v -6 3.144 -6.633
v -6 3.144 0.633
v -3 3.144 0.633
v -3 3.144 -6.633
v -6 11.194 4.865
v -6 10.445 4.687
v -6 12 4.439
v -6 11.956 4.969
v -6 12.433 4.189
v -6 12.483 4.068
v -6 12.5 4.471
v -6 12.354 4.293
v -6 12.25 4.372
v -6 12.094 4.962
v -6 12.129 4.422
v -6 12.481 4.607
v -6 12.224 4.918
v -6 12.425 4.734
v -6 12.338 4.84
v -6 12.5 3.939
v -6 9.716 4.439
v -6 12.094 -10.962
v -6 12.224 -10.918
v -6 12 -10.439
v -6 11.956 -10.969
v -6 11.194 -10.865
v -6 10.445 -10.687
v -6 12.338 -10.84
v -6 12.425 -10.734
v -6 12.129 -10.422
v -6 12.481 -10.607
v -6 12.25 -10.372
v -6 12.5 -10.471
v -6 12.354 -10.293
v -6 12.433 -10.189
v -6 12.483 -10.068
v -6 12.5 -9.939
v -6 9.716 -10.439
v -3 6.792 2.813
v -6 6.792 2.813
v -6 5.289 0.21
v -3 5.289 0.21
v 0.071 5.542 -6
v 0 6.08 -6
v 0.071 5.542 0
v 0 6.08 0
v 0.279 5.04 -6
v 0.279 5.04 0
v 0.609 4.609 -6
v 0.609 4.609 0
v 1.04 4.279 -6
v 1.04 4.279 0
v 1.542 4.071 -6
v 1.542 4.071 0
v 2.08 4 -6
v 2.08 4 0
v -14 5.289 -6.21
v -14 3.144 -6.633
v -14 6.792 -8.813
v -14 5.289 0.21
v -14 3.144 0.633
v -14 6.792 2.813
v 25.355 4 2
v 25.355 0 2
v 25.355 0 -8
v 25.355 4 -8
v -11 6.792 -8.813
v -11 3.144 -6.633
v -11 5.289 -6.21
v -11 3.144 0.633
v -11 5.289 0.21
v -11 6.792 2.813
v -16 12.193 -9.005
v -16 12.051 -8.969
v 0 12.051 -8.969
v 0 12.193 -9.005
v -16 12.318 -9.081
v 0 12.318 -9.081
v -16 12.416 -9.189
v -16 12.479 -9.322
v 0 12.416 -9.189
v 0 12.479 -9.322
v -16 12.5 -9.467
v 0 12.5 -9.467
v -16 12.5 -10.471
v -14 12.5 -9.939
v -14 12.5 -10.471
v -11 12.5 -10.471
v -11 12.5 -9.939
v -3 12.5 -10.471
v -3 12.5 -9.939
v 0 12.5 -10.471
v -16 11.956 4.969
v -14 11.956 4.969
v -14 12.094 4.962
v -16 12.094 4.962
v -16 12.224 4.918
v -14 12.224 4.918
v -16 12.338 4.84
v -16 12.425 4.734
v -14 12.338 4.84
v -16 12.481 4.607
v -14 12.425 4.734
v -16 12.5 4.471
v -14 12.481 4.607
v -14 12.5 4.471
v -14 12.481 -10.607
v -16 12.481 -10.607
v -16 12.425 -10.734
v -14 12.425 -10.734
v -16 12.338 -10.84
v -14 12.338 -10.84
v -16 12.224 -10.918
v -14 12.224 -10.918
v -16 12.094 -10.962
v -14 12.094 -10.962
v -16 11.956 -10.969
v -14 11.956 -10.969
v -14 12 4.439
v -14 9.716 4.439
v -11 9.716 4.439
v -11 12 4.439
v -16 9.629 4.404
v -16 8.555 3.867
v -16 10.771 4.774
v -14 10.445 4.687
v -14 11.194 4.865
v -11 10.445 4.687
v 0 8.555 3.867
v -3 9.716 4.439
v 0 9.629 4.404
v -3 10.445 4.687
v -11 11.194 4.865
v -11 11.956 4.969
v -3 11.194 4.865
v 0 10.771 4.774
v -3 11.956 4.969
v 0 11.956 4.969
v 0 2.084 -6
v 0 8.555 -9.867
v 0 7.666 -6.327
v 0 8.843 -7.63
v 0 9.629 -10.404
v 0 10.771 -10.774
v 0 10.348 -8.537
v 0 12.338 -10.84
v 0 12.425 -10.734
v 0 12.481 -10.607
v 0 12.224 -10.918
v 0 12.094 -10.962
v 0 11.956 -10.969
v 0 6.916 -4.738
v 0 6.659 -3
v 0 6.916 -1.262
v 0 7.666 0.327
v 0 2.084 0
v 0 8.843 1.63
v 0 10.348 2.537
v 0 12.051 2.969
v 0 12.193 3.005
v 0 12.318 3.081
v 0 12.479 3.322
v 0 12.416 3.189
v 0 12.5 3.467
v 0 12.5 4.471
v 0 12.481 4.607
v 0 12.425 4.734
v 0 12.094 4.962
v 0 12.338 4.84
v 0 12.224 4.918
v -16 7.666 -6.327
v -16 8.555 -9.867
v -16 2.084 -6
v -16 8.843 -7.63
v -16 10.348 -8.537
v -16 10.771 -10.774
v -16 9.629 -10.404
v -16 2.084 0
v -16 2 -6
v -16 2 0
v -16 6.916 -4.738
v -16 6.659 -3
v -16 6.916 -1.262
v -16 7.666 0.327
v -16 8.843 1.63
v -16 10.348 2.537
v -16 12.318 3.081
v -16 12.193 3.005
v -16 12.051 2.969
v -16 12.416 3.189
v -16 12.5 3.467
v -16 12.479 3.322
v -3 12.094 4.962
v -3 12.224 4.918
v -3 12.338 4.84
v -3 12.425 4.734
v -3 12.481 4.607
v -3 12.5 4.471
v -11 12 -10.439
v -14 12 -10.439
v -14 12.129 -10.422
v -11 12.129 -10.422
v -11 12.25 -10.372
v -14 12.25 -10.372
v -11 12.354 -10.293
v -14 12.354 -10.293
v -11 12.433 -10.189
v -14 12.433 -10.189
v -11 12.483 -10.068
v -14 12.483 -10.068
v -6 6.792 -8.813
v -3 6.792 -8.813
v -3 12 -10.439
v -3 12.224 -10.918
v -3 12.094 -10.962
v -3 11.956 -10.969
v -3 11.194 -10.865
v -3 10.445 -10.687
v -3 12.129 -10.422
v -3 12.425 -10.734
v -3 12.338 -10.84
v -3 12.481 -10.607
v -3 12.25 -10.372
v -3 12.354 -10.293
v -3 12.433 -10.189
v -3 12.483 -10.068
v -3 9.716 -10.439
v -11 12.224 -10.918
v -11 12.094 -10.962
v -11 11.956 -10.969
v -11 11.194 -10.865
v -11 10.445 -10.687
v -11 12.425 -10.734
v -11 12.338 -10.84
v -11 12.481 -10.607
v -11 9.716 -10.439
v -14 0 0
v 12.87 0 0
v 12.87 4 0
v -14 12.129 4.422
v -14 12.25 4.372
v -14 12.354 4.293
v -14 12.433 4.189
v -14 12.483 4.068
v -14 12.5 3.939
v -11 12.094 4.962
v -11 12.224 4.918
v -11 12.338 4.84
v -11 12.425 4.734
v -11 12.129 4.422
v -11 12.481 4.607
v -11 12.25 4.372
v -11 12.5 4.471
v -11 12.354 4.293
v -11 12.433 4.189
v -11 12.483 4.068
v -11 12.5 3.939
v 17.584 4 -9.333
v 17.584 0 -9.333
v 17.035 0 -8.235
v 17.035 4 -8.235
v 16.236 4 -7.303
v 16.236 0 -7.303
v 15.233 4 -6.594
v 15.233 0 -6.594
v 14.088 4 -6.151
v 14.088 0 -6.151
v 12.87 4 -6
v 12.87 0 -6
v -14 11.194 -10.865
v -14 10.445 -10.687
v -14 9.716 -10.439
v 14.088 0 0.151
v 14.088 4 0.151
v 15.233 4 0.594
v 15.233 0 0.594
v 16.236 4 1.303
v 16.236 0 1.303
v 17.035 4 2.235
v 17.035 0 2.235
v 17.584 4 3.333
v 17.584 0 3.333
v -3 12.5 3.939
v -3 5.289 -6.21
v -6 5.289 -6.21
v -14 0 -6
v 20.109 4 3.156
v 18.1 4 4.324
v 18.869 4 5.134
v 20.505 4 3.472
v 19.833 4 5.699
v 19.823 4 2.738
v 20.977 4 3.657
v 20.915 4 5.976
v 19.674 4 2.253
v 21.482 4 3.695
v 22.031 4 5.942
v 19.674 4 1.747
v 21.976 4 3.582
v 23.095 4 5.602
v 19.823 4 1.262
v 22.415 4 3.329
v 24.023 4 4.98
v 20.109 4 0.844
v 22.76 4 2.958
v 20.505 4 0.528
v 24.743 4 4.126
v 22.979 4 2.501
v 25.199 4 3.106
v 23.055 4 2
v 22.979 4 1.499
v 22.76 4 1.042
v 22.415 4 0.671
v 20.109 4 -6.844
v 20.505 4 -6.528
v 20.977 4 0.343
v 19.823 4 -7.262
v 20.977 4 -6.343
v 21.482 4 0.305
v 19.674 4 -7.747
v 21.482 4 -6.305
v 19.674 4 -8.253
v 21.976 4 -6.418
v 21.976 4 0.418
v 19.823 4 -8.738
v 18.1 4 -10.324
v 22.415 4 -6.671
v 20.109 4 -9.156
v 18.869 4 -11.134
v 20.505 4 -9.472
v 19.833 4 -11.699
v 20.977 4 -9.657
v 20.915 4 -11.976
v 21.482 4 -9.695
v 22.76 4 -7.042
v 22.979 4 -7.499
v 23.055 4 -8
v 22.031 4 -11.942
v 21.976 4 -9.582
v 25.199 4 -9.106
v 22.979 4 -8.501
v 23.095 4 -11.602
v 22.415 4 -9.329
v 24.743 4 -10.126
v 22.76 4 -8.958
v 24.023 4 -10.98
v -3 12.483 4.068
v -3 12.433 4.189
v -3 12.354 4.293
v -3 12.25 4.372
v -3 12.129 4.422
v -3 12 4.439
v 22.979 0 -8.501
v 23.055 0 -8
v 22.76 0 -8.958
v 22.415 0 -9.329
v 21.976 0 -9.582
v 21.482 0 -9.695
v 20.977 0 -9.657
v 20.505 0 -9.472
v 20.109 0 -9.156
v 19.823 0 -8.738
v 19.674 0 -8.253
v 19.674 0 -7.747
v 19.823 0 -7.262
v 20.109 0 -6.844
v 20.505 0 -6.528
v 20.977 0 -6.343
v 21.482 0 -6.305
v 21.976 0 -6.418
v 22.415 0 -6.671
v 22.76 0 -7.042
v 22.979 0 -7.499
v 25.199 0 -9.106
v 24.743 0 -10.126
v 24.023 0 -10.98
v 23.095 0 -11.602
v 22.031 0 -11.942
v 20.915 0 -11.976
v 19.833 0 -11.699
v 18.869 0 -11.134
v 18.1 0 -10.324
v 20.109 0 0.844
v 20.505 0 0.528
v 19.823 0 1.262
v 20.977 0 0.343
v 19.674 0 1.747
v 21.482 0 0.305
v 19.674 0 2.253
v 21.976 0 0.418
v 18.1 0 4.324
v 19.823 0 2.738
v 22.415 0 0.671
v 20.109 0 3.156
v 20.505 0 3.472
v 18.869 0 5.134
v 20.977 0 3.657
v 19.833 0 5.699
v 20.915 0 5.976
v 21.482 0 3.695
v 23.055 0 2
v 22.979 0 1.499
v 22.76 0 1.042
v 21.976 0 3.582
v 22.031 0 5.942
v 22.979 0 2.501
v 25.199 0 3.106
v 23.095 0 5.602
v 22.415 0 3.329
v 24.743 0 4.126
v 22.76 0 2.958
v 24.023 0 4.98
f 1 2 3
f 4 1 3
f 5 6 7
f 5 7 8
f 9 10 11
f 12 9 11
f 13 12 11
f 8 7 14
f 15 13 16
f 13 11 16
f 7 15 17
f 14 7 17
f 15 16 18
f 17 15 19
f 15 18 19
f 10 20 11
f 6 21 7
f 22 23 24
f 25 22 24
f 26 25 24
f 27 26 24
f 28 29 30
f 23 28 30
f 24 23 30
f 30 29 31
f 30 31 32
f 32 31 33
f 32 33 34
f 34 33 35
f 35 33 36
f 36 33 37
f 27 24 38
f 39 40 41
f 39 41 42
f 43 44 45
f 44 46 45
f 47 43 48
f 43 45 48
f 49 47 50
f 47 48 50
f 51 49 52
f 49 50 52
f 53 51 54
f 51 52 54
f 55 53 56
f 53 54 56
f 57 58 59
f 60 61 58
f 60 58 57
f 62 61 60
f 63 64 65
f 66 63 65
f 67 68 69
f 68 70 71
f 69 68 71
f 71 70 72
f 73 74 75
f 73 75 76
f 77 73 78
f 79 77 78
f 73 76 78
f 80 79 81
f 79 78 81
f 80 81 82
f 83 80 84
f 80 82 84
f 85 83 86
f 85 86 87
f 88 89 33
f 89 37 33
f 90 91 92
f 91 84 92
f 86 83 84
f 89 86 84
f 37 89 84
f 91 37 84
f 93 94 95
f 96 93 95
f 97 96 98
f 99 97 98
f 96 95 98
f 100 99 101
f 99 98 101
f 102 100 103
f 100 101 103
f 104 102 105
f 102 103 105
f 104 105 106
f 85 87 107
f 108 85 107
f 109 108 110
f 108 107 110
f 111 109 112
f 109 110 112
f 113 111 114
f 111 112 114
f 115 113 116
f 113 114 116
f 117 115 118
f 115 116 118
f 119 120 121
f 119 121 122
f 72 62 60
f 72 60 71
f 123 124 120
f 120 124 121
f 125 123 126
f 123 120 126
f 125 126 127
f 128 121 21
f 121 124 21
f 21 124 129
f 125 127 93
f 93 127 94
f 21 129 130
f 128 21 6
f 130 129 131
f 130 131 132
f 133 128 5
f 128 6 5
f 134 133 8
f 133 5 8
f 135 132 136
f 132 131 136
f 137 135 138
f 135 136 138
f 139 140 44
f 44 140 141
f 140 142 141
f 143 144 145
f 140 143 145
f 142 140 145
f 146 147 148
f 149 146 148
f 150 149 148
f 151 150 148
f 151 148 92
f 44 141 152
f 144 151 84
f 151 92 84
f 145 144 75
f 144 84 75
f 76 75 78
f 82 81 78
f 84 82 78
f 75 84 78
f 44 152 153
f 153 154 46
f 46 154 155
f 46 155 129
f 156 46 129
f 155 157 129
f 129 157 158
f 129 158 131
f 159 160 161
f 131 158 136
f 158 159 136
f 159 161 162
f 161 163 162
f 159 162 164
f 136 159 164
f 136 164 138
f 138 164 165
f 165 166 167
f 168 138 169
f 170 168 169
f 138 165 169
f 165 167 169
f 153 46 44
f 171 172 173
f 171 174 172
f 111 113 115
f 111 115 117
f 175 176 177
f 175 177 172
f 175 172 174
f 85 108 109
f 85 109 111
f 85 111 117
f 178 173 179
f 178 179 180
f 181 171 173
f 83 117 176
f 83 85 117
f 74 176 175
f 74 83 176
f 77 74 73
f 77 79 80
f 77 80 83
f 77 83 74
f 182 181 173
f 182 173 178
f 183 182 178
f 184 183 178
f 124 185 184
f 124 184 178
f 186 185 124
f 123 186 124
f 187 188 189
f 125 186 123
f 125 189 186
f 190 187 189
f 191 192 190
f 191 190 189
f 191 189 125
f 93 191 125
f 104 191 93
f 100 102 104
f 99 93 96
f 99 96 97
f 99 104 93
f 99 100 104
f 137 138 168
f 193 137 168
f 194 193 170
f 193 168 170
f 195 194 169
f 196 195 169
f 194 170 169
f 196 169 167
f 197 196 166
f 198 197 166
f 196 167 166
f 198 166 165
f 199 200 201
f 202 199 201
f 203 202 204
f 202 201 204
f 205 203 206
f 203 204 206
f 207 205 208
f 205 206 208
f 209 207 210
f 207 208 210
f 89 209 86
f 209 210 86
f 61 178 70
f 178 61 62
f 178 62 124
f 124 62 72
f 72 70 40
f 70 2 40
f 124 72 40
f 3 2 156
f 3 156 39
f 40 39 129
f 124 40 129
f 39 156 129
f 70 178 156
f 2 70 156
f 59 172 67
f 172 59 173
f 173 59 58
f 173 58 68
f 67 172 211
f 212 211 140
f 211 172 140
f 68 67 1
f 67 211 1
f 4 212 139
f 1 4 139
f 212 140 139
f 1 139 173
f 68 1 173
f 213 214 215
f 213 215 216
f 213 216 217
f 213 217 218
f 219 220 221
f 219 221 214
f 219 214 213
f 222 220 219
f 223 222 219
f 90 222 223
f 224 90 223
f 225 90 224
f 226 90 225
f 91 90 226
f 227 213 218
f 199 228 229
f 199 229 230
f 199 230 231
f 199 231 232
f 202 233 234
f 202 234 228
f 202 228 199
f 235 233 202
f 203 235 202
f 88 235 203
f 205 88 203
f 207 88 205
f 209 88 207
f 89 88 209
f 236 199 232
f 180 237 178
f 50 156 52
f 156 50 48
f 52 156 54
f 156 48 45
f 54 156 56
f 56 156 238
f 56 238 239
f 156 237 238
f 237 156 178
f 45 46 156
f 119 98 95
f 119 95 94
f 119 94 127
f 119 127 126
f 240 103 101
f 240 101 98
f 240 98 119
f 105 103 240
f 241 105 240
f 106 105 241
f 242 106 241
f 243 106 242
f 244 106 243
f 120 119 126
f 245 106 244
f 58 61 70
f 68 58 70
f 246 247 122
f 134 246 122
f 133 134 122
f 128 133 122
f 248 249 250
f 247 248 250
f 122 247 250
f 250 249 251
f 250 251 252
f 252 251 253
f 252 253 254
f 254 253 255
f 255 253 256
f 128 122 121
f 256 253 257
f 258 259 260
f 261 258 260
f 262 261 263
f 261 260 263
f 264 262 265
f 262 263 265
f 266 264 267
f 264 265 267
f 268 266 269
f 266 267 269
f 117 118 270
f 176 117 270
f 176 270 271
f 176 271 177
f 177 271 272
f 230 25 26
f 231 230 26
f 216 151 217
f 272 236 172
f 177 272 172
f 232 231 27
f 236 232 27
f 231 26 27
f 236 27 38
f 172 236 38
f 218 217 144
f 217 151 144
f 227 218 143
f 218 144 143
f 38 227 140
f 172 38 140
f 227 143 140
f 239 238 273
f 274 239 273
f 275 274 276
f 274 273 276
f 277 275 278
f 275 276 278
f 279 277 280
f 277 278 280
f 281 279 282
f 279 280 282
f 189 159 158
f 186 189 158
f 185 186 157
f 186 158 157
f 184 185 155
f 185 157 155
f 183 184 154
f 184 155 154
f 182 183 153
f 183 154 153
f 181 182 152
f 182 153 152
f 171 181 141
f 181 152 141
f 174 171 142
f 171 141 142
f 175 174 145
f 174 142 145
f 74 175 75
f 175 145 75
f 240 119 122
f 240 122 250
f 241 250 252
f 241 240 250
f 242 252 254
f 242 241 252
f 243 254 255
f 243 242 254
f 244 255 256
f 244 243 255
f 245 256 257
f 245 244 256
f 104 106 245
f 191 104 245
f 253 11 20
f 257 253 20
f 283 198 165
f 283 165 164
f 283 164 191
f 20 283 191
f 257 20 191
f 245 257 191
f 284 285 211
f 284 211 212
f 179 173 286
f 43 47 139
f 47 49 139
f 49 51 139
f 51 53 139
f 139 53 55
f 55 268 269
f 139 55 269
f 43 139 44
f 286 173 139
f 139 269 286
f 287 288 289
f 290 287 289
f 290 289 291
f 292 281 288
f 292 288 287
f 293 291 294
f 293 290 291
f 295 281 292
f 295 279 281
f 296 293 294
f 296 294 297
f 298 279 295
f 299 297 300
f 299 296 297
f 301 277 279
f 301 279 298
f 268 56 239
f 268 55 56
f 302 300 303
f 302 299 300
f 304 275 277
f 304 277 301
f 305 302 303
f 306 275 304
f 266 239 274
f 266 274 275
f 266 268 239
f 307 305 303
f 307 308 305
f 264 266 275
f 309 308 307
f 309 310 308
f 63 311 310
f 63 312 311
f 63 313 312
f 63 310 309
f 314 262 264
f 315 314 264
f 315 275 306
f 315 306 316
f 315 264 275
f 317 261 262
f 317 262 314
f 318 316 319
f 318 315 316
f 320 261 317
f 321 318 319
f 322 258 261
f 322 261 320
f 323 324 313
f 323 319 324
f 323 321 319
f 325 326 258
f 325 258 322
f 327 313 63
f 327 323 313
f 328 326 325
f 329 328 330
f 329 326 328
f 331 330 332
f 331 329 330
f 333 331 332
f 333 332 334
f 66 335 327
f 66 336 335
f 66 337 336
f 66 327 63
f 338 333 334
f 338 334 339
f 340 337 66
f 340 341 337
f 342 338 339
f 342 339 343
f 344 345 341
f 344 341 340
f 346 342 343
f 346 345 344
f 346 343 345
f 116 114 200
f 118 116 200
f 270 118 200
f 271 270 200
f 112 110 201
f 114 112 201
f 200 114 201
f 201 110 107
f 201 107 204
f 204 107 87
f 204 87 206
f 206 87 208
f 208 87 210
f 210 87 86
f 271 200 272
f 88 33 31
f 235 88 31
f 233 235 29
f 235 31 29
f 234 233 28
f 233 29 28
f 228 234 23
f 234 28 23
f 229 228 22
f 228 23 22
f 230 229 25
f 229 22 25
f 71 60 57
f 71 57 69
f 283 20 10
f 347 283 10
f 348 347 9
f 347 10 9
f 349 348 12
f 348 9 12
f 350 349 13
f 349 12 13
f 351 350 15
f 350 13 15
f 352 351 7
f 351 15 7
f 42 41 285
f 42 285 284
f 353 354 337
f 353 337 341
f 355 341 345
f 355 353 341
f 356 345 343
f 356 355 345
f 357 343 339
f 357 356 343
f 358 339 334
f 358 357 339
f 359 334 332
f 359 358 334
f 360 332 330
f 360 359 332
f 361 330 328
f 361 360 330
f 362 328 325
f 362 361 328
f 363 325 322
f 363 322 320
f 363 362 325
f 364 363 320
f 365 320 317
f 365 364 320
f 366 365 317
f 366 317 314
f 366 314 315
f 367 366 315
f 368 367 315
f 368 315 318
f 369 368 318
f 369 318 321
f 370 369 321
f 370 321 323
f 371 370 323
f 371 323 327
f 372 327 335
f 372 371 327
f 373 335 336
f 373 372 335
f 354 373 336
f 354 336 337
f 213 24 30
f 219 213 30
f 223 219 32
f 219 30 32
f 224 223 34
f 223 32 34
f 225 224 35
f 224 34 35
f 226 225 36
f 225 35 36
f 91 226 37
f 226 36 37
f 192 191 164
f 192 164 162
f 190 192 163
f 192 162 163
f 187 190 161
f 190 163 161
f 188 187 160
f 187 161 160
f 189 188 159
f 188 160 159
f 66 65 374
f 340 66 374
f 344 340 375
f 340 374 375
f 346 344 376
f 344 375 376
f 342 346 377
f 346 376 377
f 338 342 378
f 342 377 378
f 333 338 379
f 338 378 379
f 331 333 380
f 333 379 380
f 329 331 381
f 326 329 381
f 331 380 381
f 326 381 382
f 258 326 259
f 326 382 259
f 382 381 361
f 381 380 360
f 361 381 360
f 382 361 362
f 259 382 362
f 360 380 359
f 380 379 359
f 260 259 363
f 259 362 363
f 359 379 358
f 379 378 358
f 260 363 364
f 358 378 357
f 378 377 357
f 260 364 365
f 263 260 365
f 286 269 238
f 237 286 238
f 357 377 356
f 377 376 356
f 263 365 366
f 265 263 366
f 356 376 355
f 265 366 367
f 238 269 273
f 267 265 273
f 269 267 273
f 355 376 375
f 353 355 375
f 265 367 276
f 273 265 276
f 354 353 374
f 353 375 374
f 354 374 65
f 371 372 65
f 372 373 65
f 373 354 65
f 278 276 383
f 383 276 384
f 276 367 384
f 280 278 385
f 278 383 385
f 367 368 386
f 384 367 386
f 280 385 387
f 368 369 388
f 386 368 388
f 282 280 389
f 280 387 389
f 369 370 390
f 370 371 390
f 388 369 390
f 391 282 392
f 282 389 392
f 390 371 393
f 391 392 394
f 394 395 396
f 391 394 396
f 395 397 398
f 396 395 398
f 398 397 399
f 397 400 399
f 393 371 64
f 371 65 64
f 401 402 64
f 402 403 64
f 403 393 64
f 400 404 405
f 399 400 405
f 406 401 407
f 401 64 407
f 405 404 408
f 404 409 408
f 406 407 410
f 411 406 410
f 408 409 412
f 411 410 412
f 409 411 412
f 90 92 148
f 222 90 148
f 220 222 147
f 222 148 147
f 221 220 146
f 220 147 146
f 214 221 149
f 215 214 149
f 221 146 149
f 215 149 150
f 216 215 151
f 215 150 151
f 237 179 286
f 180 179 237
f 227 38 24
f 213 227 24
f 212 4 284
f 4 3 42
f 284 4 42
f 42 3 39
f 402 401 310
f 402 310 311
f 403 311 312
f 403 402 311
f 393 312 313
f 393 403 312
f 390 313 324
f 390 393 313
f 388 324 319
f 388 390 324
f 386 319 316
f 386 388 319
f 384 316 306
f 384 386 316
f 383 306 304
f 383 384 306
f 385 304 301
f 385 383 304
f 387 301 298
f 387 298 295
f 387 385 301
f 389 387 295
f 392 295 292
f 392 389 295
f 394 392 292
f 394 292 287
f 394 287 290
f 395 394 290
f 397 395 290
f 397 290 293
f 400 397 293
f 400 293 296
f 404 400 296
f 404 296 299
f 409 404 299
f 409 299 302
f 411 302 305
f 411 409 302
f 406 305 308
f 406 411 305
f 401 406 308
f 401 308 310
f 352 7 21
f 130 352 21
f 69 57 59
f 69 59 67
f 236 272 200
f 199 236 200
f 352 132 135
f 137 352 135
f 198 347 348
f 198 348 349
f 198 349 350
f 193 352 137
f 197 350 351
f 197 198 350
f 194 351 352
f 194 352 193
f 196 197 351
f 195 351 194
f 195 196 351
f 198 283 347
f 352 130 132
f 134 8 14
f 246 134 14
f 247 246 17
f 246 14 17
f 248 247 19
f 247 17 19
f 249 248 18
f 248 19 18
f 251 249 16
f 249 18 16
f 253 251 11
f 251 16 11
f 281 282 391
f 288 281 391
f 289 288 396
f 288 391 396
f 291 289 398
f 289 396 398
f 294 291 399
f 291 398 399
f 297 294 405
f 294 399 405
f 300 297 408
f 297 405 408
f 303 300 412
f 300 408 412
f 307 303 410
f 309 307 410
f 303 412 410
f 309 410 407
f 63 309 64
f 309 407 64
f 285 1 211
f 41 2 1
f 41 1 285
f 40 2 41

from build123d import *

# Parameters (mm, degrees)
SKETCH1_R               = 1.7
BOSS_EXTRUDE1_DEPTH     = 4
BOSS_EXTRUDE2_DEPTH     = 16
CHAMFER1_SIZE           = 2
FILLET1_R               = 2.08
SKETCH4_W               = 3
SKETCH4_H               = 2.145
CUT_EXTRUDE1_DEPTH      = 7
CUT_EXTRUDE1_DEPTH_BACK = 13
CHAMFER2_SIZE           = 1.705
CHAMFER2_SIZE2          = 1.750863319
CHAMFER2_PART_2_SIZE    = 1.705
CHAMFER2_PART_2_SIZE2   = 1.750863319
CUT_EXTRUDE2_DEPTH      = 3
CUT_EXTRUDE3_DEPTH      = 3


with BuildPart() as part:
    # Sketch1 → Boss-Extrude1 (new body)
    with BuildSketch(Plane(origin=(0, 0, 0), x_dir=(1, 0, 0), z_dir=(0, 1, 0))):
        with BuildLine():
            Line((0, 0), (12.869718626, 0))
            ThreePointArc((12.869718626, 0), (15.756469972, -0.917517095), (17.583763834, -3.333333333))
            ThreePointArc((17.583763834, -3.333333333), (22.031407915, -5.942394239), (25.355, -2))
            Line((25.355, -2), (25.355, 8))
            ThreePointArc((25.355, 8), (22.031407915, 11.942394239), (17.583763834, 9.333333333))
            ThreePointArc((17.583763834, 9.333333333), (15.756469972, 6.917517095), (12.869718626, 6))
            Line((12.869718626, 6), (0, 6))
            Line((0, 6), (0, 0))
        make_face()
        with Locations((21.355, -2)):
            Circle(SKETCH1_R, mode=Mode.SUBTRACT)
        with Locations((21.355, 8)):
            Circle(SKETCH1_R, mode=Mode.SUBTRACT)
    extrude(amount=BOSS_EXTRUDE1_DEPTH)

    # Sketch2 → Boss-Extrude2 (add)
    with BuildSketch(Plane.ZY):
        with BuildLine():
            Line((-6, 0), (0, 0))
            Line((0, 0), (0, 2.084))
            Line((0, 2.084), (3.867185515, 8.555128278))
            ThreePointArc((3.867185515, 8.555128278), (4.610527286, 10.193259862), (4.969057957, 11.956066667))
            ThreePointArc((4.969057957, 11.956066667), (4.839751016, 12.337663541), (4.470991835, 12.5))
            Line((4.470991835, 12.5), (3.466507481, 12.5))
            ThreePointArc((3.466507481, 12.5), (3.131355391, 12.371043228), (2.969083828, 12.050692308))
            ThreePointArc((2.969083828, 12.050692308), (-3, 6.659), (-8.969083828, 12.050692308))
            ThreePointArc((-8.969083828, 12.050692308), (-9.131355391, 12.371043228), (-9.466507481, 12.5))
            Line((-9.466507481, 12.5), (-10.470991835, 12.5))
            ThreePointArc((-10.470991835, 12.5), (-10.839751016, 12.337663541), (-10.969057957, 11.956066667))
            ThreePointArc((-10.969057957, 11.956066667), (-10.610527286, 10.193259862), (-9.867185515, 8.555128278))
            Line((-9.867185515, 8.555128278), (-6, 2.084))
            Line((-6, 2.084), (-6, 0))
        make_face()
    extrude(amount=BOSS_EXTRUDE2_DEPTH)

    # Chamfer1
    chamfer1_edges = [part.edges().sort_by_distance(p)[0] for p in [
        (-16, 0, -3),
    ]]
    chamfer(chamfer1_edges, length=CHAMFER1_SIZE)

    # Fillet1
    fillet1_edges = [part.edges().sort_by_distance(p)[0] for p in [
        (0, 4, -3),
    ]]
    fillet(fillet1_edges, radius=FILLET1_R)

    # Sketch4 → Cut-Extrude1 (cut, two sides)
    with BuildSketch(Plane.XY) as cut_extrude1_sk:
        with Locations((-12.5, 4.2165)):
            Rectangle(SKETCH4_W, SKETCH4_H)
        with Locations((-4.5, 4.2165)):
            Rectangle(SKETCH4_W, SKETCH4_H)
    extrude(amount=CUT_EXTRUDE1_DEPTH, mode=Mode.SUBTRACT)
    extrude(cut_extrude1_sk.sketch, amount=-CUT_EXTRUDE1_DEPTH_BACK, mode=Mode.SUBTRACT)

    # Chamfer2
    chamfer2_edges = [part.edges().sort_by_distance(p)[0] for p in [
        (-4.5, 5.289, -7.915327442),
        (-4.5, 5.289, 1.915327442),
    ]]
    chamfer2_side = [part.faces().sort_by_distance(p)[0] for p in [
        (-4.5, 5.289, -3),
    ]]
    chamfer(chamfer2_edges, length=CHAMFER2_SIZE, length2=CHAMFER2_SIZE2, reference=chamfer2_side[0])

    # Chamfer2 part 2
    chamfer2_part_2_edges = [part.edges().sort_by_distance(p)[0] for p in [
        (-12.5, 5.289, -7.915327442),
        (-12.5, 5.289, 1.915327442),
    ]]
    chamfer2_part_2_side = [part.faces().sort_by_distance(p)[0] for p in [
        (-12.5, 5.289, -3),
    ]]
    chamfer(chamfer2_part_2_edges, length=CHAMFER2_PART_2_SIZE, length2=CHAMFER2_PART_2_SIZE2, reference=chamfer2_part_2_side[0])

    # Sketch5 → Cut-Extrude2 (cut)
    with BuildSketch(Plane.ZY.offset(14)):
        with BuildLine():
            Line((4.439002016, 9.716), (4.439002016, 12))
            ThreePointArc((4.439002016, 12), (4.292555407, 12.353553391), (3.939002016, 12.5))
            Line((3.939002016, 12.5), (4.470991835, 12.5))
            ThreePointArc((4.470991835, 12.5), (4.839751016, 12.337663541), (4.969057957, 11.956066667))
            ThreePointArc((4.969057957, 11.956066667), (4.785021047, 10.816868818), (4.439002016, 9.716))
        make_face()
        with BuildLine():
            Line((-9.939002016, 12.5), (-10.470991835, 12.5))
            ThreePointArc((-10.470991835, 12.5), (-10.839751016, 12.337663541), (-10.969057957, 11.956066667))
            ThreePointArc((-10.969057957, 11.956066667), (-10.785021047, 10.816868818), (-10.439002016, 9.716))
            Line((-10.439002016, 9.716), (-10.439002016, 12))
            ThreePointArc((-10.439002016, 12), (-10.292555407, 12.353553391), (-9.939002016, 12.5))
        make_face()
    extrude(amount=-CUT_EXTRUDE2_DEPTH, mode=Mode.SUBTRACT)

    # Sketch6 → Cut-Extrude3 (cut)
    with BuildSketch(Plane.ZY.offset(6)):
        with BuildLine():
            Line((4.470991835, 12.5), (3.939002016, 12.5))
            ThreePointArc((3.939002016, 12.5), (4.292555407, 12.353553391), (4.439002016, 12))
            Line((4.439002016, 12), (4.439002016, 9.716))
            ThreePointArc((4.439002016, 9.716), (4.785021047, 10.816868818), (4.969057957, 11.956066667))
            ThreePointArc((4.969057957, 11.956066667), (4.839751016, 12.337663541), (4.470991835, 12.5))
        make_face()
        with BuildLine():
            Line((-9.939002016, 12.5), (-10.470991835, 12.5))
            ThreePointArc((-10.470991835, 12.5), (-10.839751016, 12.337663541), (-10.969057957, 11.956066667))
            ThreePointArc((-10.969057957, 11.956066667), (-10.785021047, 10.816868818), (-10.439002016, 9.716))
            Line((-10.439002016, 9.716), (-10.439002016, 12))
            ThreePointArc((-10.439002016, 12), (-10.292555407, 12.353553391), (-9.939002016, 12.5))
        make_face()
    extrude(amount=-CUT_EXTRUDE3_DEPTH, mode=Mode.SUBTRACT)


solid = part.part
